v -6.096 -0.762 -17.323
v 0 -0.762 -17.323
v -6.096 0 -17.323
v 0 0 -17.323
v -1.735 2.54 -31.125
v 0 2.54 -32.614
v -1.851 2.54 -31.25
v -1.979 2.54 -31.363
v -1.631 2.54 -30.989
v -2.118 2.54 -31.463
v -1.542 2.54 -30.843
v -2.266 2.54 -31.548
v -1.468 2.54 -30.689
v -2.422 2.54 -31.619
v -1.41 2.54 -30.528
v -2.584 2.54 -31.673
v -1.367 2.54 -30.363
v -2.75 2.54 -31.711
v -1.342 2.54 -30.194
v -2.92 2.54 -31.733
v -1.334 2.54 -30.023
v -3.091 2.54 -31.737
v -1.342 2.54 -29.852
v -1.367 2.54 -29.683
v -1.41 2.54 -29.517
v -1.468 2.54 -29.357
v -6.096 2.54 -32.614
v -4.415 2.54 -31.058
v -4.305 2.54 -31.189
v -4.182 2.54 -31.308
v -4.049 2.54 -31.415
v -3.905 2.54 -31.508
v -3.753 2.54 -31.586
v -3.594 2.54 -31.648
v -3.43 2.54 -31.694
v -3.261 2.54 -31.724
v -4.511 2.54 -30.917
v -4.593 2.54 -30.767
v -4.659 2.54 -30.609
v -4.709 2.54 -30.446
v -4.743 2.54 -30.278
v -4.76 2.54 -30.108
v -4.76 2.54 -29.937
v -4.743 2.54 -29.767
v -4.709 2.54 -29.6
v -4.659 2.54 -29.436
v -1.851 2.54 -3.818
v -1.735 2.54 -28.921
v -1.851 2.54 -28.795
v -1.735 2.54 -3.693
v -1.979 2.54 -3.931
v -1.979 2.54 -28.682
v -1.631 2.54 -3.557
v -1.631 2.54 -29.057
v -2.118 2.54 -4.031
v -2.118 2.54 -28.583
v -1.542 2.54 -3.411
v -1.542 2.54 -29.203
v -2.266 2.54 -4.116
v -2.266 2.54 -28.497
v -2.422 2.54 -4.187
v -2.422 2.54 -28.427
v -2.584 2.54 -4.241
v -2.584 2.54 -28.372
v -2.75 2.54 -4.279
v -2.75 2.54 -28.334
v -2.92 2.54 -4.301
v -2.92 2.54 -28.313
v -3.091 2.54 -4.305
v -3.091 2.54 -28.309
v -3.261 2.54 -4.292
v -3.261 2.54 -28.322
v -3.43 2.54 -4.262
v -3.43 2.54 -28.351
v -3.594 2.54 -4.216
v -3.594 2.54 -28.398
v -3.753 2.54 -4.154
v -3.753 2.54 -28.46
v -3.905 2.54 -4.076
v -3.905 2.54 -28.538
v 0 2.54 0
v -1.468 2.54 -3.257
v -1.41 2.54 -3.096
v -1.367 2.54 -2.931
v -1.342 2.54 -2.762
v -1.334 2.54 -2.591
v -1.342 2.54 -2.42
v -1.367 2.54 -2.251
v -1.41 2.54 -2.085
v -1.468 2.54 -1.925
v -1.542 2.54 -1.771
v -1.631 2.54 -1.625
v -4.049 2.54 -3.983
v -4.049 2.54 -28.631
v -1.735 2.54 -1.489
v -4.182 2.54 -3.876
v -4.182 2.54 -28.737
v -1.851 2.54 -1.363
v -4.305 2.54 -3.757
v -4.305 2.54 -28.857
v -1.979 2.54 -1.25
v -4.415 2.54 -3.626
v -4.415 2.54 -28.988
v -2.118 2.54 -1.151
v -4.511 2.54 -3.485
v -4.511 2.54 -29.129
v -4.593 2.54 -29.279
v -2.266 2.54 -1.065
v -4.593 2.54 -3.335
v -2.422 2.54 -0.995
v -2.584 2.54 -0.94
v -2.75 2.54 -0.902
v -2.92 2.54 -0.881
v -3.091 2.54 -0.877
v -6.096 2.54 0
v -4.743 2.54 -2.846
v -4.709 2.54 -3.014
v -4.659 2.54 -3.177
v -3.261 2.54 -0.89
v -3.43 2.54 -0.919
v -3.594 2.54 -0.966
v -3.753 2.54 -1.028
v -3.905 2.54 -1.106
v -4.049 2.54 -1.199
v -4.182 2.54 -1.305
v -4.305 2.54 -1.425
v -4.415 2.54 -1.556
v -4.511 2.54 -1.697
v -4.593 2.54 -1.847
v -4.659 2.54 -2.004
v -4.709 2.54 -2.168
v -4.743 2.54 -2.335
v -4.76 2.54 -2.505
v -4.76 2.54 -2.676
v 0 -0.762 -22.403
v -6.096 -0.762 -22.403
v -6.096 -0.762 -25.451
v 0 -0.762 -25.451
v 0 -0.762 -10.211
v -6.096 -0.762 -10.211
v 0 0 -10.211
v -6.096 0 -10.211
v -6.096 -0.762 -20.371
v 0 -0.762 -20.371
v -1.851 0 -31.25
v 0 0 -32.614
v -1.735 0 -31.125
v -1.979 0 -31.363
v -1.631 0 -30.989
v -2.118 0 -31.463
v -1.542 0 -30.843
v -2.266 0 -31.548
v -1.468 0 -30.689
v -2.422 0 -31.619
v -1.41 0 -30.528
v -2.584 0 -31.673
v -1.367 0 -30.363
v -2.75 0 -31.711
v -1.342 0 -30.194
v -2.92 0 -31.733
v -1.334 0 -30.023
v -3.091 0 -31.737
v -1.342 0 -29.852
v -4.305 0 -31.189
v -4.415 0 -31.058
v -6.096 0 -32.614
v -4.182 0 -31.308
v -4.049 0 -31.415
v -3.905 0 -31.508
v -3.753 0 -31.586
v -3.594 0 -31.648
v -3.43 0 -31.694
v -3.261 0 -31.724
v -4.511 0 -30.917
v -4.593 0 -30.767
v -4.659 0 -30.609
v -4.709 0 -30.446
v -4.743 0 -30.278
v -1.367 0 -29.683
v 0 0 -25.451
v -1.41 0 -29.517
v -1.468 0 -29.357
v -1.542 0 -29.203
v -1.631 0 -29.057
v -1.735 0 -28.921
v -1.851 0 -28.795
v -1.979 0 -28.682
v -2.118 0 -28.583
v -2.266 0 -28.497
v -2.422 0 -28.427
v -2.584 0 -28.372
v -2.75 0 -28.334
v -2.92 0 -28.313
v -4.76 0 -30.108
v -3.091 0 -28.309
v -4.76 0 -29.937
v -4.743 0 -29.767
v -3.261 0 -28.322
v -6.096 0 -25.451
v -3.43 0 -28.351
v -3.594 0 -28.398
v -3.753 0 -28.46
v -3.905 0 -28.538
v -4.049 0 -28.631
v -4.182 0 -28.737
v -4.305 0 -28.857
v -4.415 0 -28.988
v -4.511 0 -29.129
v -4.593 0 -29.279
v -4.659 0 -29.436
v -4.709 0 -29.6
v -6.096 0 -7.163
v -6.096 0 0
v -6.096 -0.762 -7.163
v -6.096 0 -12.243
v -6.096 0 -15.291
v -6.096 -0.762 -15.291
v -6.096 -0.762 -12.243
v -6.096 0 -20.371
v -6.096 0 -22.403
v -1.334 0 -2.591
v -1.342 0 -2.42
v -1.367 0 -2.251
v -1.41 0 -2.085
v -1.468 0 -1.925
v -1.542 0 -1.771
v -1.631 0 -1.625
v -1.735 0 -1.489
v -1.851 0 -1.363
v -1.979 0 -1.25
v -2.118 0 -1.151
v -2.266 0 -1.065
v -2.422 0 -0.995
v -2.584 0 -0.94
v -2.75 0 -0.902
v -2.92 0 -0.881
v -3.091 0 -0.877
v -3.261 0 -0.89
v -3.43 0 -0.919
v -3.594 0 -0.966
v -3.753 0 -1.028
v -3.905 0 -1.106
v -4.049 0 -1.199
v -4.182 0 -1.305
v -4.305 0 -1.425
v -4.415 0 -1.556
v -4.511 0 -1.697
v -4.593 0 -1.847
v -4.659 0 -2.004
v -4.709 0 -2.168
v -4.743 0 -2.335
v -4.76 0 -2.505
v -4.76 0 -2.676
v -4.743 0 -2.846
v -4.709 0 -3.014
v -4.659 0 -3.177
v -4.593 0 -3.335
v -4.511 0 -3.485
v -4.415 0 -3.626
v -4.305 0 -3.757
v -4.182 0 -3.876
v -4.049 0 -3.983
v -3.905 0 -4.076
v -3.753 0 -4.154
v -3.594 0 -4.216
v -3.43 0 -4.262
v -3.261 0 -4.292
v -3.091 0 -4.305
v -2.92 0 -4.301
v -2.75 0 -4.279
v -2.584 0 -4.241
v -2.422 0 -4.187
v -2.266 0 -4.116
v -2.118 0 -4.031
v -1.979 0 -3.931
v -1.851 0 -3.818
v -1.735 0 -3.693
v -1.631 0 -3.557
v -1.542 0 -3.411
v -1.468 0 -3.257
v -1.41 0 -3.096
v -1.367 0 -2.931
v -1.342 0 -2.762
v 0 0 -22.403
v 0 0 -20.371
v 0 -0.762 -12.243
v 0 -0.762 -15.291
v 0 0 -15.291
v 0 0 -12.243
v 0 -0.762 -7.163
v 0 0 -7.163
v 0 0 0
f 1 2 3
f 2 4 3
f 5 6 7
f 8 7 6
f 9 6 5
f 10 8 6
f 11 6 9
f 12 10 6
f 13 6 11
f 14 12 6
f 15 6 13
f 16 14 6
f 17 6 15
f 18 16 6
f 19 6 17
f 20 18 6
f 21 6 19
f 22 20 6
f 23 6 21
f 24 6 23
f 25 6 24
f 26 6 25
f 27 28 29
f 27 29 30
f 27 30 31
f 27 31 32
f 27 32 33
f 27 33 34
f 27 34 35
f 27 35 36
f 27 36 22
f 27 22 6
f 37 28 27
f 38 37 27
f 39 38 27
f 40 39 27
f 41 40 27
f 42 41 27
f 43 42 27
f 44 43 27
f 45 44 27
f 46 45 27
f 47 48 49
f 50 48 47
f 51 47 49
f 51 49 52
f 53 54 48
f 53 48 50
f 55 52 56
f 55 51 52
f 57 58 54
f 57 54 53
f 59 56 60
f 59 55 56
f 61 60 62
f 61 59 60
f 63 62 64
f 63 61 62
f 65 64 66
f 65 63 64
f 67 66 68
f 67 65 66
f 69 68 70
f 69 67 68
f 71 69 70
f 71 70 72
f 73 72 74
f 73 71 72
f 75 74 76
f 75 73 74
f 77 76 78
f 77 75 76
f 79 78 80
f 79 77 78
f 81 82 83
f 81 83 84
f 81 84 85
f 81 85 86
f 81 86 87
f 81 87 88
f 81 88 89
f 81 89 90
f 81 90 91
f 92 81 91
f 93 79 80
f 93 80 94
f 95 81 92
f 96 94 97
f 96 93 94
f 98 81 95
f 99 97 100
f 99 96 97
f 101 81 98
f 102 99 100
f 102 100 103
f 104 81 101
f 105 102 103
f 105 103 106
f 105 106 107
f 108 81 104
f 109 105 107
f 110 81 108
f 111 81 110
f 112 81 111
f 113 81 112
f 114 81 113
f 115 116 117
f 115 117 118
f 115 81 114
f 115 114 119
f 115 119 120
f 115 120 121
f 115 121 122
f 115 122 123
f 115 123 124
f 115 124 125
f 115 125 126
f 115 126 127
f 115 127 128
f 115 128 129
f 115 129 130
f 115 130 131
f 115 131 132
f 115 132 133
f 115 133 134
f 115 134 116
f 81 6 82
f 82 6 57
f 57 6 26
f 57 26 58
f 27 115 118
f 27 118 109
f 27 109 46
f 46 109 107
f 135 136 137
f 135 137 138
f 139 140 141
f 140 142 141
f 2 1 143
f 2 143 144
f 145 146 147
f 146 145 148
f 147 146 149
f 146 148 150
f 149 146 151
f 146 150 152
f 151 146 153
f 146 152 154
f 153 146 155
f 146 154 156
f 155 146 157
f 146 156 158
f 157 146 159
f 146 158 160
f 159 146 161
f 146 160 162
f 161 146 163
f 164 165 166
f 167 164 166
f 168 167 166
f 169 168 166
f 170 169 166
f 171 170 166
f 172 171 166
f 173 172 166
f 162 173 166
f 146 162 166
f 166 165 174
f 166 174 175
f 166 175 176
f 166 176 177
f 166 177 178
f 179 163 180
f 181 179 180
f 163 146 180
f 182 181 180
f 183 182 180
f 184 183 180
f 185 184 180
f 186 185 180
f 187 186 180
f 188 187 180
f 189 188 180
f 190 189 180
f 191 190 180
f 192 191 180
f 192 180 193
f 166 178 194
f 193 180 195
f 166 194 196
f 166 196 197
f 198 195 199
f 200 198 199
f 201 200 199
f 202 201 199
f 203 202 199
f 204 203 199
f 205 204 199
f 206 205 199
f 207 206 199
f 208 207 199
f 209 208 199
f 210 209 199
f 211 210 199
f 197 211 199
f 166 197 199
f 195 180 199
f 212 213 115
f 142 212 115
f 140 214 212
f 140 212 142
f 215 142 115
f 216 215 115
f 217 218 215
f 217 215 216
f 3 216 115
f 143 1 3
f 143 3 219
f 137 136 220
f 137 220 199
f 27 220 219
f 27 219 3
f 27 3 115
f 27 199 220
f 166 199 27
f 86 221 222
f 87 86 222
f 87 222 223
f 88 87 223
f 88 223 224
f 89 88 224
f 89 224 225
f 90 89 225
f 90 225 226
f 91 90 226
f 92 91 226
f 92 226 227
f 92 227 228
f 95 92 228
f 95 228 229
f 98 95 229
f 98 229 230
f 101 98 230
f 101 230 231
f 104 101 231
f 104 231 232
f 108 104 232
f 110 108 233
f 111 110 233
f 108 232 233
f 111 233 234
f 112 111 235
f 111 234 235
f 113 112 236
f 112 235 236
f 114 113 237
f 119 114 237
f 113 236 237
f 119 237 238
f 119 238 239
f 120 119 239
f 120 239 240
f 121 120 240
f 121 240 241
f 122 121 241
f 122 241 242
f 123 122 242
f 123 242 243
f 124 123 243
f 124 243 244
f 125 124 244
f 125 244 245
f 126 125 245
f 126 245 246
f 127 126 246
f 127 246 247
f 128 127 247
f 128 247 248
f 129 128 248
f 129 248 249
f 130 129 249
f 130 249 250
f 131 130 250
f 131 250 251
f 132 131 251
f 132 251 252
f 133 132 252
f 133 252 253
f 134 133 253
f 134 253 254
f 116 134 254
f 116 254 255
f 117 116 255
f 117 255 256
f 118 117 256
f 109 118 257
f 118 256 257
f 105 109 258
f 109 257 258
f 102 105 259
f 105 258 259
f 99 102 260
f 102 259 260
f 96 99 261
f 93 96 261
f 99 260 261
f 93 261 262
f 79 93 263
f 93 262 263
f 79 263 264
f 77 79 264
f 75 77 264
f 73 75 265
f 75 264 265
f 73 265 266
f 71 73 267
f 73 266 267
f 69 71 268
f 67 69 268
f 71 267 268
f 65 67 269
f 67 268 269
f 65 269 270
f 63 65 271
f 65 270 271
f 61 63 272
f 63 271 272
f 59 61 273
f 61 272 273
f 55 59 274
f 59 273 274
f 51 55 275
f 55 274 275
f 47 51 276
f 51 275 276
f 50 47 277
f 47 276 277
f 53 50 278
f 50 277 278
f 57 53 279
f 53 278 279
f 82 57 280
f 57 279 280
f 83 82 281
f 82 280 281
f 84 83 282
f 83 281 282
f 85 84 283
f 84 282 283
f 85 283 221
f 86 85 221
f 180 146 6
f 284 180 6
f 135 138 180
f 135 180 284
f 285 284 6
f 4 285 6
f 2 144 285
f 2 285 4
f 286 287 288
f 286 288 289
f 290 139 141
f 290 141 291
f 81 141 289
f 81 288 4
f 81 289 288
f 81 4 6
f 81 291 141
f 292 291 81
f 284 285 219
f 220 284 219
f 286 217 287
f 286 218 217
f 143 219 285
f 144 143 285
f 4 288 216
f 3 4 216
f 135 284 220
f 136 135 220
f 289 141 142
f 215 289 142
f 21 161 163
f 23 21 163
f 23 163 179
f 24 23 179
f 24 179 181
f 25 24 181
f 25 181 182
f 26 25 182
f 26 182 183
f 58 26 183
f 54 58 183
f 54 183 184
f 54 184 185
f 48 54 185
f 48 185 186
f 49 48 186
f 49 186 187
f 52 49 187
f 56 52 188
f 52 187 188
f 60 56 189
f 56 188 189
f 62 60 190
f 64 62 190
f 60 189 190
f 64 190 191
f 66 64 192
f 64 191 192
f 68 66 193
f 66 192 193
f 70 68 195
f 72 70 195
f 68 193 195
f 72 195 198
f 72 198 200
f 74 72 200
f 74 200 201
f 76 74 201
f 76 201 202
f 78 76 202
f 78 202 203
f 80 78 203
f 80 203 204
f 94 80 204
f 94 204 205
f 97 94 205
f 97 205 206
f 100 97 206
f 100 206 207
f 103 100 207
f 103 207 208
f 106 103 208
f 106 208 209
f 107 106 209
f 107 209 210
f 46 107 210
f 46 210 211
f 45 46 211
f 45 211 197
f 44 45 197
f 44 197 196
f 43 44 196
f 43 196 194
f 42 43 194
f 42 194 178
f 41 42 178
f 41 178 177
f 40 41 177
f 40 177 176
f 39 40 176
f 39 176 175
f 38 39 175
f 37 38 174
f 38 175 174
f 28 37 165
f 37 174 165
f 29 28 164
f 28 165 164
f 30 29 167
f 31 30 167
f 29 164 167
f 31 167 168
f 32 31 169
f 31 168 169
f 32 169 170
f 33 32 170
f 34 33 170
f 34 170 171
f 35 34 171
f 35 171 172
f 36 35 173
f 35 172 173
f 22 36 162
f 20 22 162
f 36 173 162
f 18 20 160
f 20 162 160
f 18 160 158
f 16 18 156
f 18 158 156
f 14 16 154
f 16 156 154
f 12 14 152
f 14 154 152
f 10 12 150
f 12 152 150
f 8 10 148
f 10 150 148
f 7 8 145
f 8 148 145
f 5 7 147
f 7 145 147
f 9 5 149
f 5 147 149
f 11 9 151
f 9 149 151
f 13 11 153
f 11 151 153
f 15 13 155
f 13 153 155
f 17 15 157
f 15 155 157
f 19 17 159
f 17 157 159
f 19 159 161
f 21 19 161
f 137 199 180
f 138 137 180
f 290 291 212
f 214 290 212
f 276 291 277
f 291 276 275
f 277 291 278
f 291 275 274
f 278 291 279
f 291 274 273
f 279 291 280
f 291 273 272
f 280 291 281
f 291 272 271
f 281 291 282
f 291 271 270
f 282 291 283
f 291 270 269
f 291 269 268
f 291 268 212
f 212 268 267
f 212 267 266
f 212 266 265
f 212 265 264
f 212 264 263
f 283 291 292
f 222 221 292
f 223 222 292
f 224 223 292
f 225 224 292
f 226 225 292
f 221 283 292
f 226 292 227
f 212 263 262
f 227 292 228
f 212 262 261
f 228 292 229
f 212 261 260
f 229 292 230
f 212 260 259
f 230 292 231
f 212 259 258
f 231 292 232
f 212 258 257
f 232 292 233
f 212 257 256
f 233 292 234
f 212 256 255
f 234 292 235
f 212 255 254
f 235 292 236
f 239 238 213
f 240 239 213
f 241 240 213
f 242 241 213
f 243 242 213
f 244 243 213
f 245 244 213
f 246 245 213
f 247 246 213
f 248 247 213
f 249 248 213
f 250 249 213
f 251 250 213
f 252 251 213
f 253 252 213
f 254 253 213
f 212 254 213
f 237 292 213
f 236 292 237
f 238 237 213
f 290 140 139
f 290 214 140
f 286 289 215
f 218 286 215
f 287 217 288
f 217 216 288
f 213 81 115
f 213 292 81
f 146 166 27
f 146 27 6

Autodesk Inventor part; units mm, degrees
ref_plane "YZ Plane" through (0, 0, 0) normal (1, 0, 0) x (0, 1, 0)
ref_plane "XZ Plane" through (0, 0, 0) normal (0, 1, 0) x (-1, 0, 0)
ref_plane "XY Plane" through (0, 0, 0) normal (0, 0, 1) x (1, 0, 0)
sketch "Sketch1" plane through (0, 0, 0) normal (0, 1, 0) x (-1, 0, 0)
  line L0 (0, 0) -> (6.096, 0)
  line L1 (6.096, 0) -> (6.096, -32.6136)
  line L2 (6.096, -32.6136) -> (0, -32.6136)
  line L3 (0, -32.6136) -> (0, 0)
  dimension "d0" = 6.096
  dimension "d1" = 32.6136
extrude "Extrusion1" add sketch "Sketch1" along normal blind 2.54
sketch "Sketch2" plane through (0, 0, 0) normal (0, -1, 0) x (1, 0, 0)
  line L0 (0, 0) -> (0, -32.6136) projected
  line L1 (0, -7.1628) -> (-6.096, -7.1628)
  line L2 (-6.096, -7.1628) -> (-6.096, -10.2108)
  line L3 (-6.096, -10.2108) -> (0, -10.2108)
  line L4 (0, -10.2108) -> (0, -7.1628)
  line L5 (0, -12.2428) -> (-6.096, -12.2428)
  line L6 (-6.096, -12.2428) -> (-6.096, -15.2908)
  line L7 (-6.096, -15.2908) -> (0, -15.2908)
  line L8 (0, -15.2908) -> (0, -12.2428)
  line L9 (0, -17.3228) -> (-6.096, -17.3228)
  line L10 (-6.096, -17.3228) -> (-6.096, -20.3708)
  line L11 (-6.096, -20.3708) -> (0, -20.3708)
  line L12 (0, -20.3708) -> (0, -17.3228)
  line L13 (0, -22.4028) -> (-6.096, -22.4028)
  line L14 (-6.096, -22.4028) -> (-6.096, -25.4508)
  line L15 (-6.096, -25.4508) -> (0, -25.4508)
  line L16 (0, -25.4508) -> (0, -22.4028)
  line L17 (-3.048, -10.2108) -> (-3.048, -12.2428) construction
  line L18 (-3.048, -15.2908) -> (-3.048, -17.3228) construction
  line L19 (-3.048, -20.3708) -> (-3.048, -22.4028) construction
  line L20 (-6.096, 0) -> (-6.096, -32.6136) construction
  line L21 (-6.096, 0) -> (0, 0) construction
  line L22 (0, -7.1628) -> (0, 0) construction
  line L23 (0, -32.6136) -> (0, -25.4508) construction
  dimension "d4" = 3.048
  dimension "d13" = 2.032
extrude "Extrusion2" add sketch "Sketch2" along normal blind 0.762
sketch "Sketch3" plane through (0, 0, 0) normal (0, -1, 0) x (1, 0, 0)
  line L0 (0, -7.1628) -> (-6.096, -7.1628) construction
  line L1 (-6.096, -7.1628) -> (-6.096, -10.2108) construction
  line L2 (-6.096, -10.2108) -> (0, -10.2108) construction
  line L3 (0, -10.2108) -> (0, -7.1628) construction
  line L4 (0, -22.4028) -> (-6.096, -22.4028) construction
  line L5 (-6.096, -22.4028) -> (-6.096, -25.4508) construction
  line L6 (-6.096, -25.4508) -> (0, -25.4508) construction
  line L7 (0, -25.4508) -> (0, -22.4028) construction
  circle A0 centre (-3.048, -2.5908) radius 1.7145
  circle A1 centre (-3.048, -30.0228) radius 1.7145
  line L8 (0, -7.1628) -> (-6.096, -7.1628) projected
  line L9 (-6.096, -25.4508) -> (0, -25.4508) projected
  point P0 (0, 0)
  point P1 (-3.048, -7.1628)
  point P2 (-3.048, -25.4508)
  dimension "d7" = 4.572
  dimension "d8" = 4.572
  dimension "d9" = 3.429
  dimension "d10" = 3.429
extrude "Extrusion3" cut sketch "Sketch3" against normal through all
equation "\"d8\" = d7"
equation "\"d10\" = d9"
properties part number "ContactPress" material "ABS Plastic"
